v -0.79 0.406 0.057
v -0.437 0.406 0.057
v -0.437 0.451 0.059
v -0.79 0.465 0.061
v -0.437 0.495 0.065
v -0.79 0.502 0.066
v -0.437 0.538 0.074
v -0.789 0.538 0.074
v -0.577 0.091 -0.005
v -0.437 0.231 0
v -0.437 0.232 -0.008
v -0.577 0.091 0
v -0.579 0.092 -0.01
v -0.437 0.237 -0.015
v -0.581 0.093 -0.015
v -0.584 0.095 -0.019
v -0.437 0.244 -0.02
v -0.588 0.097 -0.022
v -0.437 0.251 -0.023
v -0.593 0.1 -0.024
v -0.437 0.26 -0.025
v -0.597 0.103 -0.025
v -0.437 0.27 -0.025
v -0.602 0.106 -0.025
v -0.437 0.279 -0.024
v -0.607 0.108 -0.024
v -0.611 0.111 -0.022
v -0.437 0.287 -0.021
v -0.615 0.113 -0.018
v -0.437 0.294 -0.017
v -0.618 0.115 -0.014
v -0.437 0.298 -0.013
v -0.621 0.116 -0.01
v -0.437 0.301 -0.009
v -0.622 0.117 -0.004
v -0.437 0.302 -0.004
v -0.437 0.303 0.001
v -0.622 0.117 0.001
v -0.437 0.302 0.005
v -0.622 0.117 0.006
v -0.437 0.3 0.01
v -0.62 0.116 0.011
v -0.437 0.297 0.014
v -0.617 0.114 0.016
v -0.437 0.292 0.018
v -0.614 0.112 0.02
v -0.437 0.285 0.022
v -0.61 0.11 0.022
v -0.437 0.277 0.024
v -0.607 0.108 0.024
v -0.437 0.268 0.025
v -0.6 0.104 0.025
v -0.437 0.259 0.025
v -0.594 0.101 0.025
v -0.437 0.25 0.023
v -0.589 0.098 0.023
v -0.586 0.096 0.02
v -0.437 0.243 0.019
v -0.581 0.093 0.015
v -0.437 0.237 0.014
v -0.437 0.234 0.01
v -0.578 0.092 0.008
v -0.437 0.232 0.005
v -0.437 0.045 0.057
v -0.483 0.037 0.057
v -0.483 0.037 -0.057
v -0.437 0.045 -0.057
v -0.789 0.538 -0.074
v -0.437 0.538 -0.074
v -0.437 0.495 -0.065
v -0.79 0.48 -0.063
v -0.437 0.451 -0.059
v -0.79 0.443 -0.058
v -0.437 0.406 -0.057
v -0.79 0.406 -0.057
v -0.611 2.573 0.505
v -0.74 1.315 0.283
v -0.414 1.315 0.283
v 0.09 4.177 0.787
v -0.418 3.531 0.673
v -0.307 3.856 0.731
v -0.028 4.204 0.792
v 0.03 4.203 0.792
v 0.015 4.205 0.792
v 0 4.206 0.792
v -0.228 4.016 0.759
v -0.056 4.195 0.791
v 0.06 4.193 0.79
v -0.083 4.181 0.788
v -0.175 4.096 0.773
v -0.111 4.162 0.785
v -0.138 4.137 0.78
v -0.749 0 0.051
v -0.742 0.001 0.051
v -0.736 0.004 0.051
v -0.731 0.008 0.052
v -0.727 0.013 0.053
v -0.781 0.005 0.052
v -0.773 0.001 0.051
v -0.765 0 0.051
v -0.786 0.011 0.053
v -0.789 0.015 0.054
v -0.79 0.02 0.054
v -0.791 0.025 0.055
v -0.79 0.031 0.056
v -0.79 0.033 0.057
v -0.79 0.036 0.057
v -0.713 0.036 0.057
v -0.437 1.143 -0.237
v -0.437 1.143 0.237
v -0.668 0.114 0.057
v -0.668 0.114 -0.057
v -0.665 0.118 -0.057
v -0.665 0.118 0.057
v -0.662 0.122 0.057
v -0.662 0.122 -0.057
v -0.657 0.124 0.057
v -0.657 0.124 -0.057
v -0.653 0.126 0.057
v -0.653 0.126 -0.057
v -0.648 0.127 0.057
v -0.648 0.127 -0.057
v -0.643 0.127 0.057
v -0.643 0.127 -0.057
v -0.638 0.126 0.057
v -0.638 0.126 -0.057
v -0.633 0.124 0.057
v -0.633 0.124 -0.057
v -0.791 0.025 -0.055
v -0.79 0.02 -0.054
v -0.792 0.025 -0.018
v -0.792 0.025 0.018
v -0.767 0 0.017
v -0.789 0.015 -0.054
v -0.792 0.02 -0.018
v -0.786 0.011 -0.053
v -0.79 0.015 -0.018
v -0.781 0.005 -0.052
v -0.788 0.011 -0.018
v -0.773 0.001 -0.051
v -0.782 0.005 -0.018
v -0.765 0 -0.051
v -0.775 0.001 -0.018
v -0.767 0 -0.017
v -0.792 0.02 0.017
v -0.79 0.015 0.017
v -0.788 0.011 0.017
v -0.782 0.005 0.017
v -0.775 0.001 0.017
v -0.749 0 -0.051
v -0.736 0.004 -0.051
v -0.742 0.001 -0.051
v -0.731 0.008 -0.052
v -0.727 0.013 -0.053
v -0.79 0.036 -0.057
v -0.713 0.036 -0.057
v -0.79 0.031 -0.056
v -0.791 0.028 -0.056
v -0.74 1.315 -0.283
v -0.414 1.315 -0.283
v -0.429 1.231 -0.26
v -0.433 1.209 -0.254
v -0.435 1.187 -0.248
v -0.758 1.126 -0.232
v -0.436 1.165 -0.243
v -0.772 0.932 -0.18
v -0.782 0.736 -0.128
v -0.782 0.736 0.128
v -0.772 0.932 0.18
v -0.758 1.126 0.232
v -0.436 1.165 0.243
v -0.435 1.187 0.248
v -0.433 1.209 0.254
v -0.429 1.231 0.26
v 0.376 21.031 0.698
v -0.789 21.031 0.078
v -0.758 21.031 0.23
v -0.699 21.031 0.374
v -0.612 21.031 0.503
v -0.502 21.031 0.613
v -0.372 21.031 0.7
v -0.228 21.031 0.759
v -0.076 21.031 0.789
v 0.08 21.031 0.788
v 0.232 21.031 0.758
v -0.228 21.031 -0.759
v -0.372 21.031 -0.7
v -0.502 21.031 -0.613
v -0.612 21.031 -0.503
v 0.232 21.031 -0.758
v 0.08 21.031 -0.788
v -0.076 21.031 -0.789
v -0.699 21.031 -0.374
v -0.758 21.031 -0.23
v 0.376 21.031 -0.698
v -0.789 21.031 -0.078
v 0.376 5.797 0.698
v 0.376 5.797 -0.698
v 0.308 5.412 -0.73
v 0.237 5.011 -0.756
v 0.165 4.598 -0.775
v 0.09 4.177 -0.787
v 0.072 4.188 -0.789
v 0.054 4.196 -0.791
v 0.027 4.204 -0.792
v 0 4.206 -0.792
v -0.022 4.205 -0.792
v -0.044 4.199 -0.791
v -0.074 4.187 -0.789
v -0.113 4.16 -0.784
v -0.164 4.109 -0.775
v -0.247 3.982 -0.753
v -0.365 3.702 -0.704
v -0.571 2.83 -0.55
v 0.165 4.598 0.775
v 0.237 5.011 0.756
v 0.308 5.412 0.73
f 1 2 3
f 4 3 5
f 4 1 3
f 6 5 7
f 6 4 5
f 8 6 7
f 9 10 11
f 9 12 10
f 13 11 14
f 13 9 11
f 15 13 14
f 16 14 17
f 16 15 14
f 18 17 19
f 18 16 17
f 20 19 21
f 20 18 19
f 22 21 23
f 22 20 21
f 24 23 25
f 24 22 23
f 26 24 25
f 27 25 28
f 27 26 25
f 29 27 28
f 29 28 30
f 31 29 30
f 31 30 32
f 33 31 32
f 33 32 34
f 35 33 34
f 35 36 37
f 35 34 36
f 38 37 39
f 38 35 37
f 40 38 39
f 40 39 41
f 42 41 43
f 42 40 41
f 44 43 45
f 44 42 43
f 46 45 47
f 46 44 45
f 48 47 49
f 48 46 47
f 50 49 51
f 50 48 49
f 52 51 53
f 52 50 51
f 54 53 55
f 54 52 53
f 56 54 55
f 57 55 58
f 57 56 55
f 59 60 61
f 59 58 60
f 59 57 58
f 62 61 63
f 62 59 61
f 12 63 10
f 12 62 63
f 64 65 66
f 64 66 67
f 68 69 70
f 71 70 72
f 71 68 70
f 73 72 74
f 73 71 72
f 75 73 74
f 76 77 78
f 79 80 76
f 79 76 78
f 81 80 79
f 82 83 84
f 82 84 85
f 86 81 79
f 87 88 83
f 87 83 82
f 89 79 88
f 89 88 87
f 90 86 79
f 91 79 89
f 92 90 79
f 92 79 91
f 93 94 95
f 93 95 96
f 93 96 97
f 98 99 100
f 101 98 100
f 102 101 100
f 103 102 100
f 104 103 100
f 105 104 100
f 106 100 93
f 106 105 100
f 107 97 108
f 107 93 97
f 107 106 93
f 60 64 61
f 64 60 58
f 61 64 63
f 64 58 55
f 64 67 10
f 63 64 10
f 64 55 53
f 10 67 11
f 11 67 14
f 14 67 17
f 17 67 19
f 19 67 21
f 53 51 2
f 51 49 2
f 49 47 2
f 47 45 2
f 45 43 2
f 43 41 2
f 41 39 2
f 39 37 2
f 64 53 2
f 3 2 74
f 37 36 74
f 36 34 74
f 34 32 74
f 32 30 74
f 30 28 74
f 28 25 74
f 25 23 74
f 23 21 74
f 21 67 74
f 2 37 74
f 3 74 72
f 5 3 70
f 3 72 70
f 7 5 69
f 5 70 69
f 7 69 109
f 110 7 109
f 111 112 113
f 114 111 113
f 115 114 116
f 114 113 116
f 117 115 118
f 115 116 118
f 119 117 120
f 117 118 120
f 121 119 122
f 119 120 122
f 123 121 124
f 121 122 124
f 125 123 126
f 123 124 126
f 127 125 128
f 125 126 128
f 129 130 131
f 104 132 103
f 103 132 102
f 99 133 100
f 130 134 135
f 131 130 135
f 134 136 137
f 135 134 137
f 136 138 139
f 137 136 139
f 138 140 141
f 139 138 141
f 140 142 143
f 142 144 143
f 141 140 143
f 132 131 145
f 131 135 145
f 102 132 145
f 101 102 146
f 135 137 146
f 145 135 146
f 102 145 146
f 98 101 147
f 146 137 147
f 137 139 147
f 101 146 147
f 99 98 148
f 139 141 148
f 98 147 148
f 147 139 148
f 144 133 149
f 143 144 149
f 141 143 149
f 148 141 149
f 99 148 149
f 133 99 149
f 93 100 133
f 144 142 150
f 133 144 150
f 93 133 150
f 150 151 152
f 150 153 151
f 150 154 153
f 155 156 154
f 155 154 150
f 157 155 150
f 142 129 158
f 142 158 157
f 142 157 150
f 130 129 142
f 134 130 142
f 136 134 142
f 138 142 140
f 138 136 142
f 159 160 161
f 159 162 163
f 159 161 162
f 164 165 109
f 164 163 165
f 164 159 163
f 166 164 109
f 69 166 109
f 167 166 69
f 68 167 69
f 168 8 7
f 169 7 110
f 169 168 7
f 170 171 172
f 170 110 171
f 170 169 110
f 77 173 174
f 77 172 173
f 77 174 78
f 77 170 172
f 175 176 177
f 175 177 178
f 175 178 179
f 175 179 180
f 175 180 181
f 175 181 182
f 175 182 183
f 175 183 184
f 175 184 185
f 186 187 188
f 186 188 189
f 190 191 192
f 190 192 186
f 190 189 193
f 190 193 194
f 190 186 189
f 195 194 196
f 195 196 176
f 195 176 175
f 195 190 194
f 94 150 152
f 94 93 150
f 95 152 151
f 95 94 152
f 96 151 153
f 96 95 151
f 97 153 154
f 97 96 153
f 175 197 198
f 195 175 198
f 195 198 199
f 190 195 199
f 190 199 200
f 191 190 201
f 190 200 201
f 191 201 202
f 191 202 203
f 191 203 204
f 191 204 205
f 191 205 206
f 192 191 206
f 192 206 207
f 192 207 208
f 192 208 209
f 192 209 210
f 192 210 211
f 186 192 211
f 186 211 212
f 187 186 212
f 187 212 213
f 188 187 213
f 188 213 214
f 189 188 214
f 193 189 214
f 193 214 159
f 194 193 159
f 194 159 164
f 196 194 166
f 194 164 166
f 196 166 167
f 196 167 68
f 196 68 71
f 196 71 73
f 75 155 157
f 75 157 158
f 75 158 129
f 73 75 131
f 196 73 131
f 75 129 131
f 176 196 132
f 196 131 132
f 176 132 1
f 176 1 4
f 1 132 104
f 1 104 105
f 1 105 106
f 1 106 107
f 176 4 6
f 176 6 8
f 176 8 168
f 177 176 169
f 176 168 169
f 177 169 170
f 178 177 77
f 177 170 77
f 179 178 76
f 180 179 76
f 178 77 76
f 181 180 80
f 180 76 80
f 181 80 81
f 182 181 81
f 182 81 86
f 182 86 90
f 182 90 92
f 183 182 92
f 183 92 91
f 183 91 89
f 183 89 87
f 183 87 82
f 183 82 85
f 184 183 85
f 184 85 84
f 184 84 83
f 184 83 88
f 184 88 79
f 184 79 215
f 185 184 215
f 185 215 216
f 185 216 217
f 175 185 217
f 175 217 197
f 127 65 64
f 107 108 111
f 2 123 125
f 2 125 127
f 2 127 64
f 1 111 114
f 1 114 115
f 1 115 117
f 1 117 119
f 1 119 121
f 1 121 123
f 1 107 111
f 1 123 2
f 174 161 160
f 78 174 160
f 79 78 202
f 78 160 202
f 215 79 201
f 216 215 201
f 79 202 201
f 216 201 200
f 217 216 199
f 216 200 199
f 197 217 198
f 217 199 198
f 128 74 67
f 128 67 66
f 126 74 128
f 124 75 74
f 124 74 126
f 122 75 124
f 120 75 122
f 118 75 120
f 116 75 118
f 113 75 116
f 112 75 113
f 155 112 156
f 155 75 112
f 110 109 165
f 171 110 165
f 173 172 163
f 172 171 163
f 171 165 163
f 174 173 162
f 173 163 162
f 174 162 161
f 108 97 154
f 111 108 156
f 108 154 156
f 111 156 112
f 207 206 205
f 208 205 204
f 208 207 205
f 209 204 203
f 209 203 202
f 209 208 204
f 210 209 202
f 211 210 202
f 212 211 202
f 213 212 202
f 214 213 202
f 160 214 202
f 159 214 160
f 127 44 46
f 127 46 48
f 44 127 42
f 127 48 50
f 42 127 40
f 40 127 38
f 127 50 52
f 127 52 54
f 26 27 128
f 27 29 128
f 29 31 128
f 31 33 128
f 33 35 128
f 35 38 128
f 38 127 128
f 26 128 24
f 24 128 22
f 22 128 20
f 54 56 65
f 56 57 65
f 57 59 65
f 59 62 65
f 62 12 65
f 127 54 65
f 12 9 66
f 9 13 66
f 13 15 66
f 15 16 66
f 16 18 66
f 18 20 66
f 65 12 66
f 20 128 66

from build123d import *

# Parameters (mm, degrees)
TD_REV_FEATURE_DEPTH            = 21.0312
ISA_REV_FEATURE_DEPTH           = 22.061040395
ISA_REV_FEATURE_DEPTH_BACK      = 22.061040395
BA_REV_FEATURE_DEPTH            = 22.061040395
BA_REV_FEATURE_DEPTH_BACK       = 22.061040395
SLB_REV_FEATURE_DEPTH           = 22.061040395
SLB_REV_FEATURE_DEPTH_BACK      = 22.061040395
VR_REV_FEATURE_DEPTH            = 22.061040395
VR_REV_FEATURE_DEPTH_BACK       = 22.061040395
ND_REV_FEATURE_DEPTH            = 22.061040503
ND_REV_FEATURE_DEPTH_BACK       = 22.061040503
REV_HOLE_CUT_FEATURE_DEPTH      = 22.162851782
REV_HOLE_CUT_FEATURE_DEPTH_BACK = 22.162851782
REV_F_FR_FEATURE_R              = 0.0254
REV_F_BR_FEATURE_R              = 0.0254


with BuildPart() as part:
    # td_rev_sketch → td_rev_feature (new body)
    with BuildSketch(Plane(origin=(0, 0, 0), x_dir=(1, 0, 0), z_dir=(0, 1, 0))):
        with BuildLine():
            Line((0.37592, -0.697645113), (0.37592, 0.697645113))
            ThreePointArc((0.37592, 0.697645113), (-0.79248, 0), (0.37592, -0.697645113))
        make_face()
    extrude(amount=TD_REV_FEATURE_DEPTH)

    # isa_rev_sketch → isa_rev_feature (cut, two sides: drawn at the far end of the back side and taken through both)
    with BuildSketch(Plane(origin=(0, 0, 0), x_dir=(0, 0, -1), z_dir=(1, 0, 0)).offset(-ISA_REV_FEATURE_DEPTH_BACK)):
        Polygon((8.398066277, 47.339699483), (0.79248, 4.2062763), (0.0508, 0), (-0.0508, 0), (-0.79248, 4.2062763), (-8.398066277, 47.339699483), (-8.398066277, -40.25795204), (8.398066277, -40.25795204), align=None)
    extrude(amount=ISA_REV_FEATURE_DEPTH + ISA_REV_FEATURE_DEPTH_BACK, mode=Mode.SUBTRACT)

    # ba_rev_sketch → ba_rev_feature (cut, two sides: drawn at the far end of the back side and taken through both)
    with BuildSketch(Plane.XY.offset(-BA_REV_FEATURE_DEPTH_BACK)):
        Polygon((-52.01559187, -9.04993148), (-0.69088, 0), (-0.428729423, 0.04622422), (0.37592, 4.609617863), (9.42585148, 55.934329733), (85.165346017, -15.675992153), (23.723902667, -80.660253365), align=None)
    extrude(amount=BA_REV_FEATURE_DEPTH + BA_REV_FEATURE_DEPTH_BACK, mode=Mode.SUBTRACT)

    # slb_rev_sketch → slb_rev_feature (cut, two sides: drawn at the far end of the back side and taken through both)
    with BuildSketch(Plane.XY.offset(-SLB_REV_FEATURE_DEPTH_BACK)):
        with BuildLine():
            Line((-0.43688, -52.09380084), (-0.43688, 0))
            Line((-0.43688, 0), (-0.43688, 1.143))
            ThreePointArc((-0.43688, 1.143), (-0.434946907, 1.187275117), (-0.429162339, 1.231213274))
            Line((-0.429162339, 1.231213274), (0.37592, 5.797062104))
            Line((0.37592, 5.797062104), (9.421913584, 57.099441055))
            Line((9.421913584, 57.099441055), (113.187433376, 47.730703366))
            Line((113.187433376, 47.730703366), (103.328639792, -61.462538529))
            Line((103.328639792, -61.462538529), (-0.43688, -52.09380084))
        make_face()
    extrude(amount=SLB_REV_FEATURE_DEPTH + SLB_REV_FEATURE_DEPTH_BACK, mode=Mode.SUBTRACT)

    # vr_rev_sketch → vr_rev_feature (cut, two sides: drawn at the far end of the back side and taken through both)
    with BuildSketch(Plane(origin=(0, 0, 0), x_dir=(0, 0, -1), z_dir=(1, 0, 0)).offset(-VR_REV_FEATURE_DEPTH_BACK)):
        with BuildLine():
            Line((12.638111697, 47.42606773), (0.79248, 3.217568389))
            Line((0.79248, 3.217568389), (0.07445968, 0.537880075))
            ThreePointArc((0.07445968, 0.537880075), (0.06149601, 0.472707306), (0.05715, 0.4064))
            Line((0.05715, 0.4064), (0.05715, 0))
            Line((0.05715, 0), (-0.05715, 0))
            Line((-0.05715, 0), (-0.05715, 0.4064))
            ThreePointArc((-0.05715, 0.4064), (-0.06149601, 0.472707306), (-0.07445968, 0.537880075))
            Line((-0.07445968, 0.537880075), (-0.79248, 3.217568389))
            Line((-0.79248, 3.217568389), (-12.638111697, 47.42606773))
            Line((-12.638111697, 47.42606773), (-12.638111697, -44.109944949))
            Line((-12.638111697, -44.109944949), (12.638111697, -44.109944949))
            Line((12.638111697, -44.109944949), (12.638111697, 47.42606773))
        make_face()
    extrude(amount=VR_REV_FEATURE_DEPTH + VR_REV_FEATURE_DEPTH_BACK, mode=Mode.SUBTRACT)

    # erw_rev_sketch → nd_rev_feature (cut, two sides: drawn at the far end of the back side and taken through both)
    with BuildSketch(Plane.XY.offset(-ND_REV_FEATURE_DEPTH_BACK)):
        with BuildLine():
            Line((-0.73406, 0), (-0.668068864, 0.1143))
            ThreePointArc((-0.668068864, 0.1143), (-0.652645823, 0.126134516), (-0.633371819, 0.123597045))
            Line((-0.633371819, 0.123597045), (-0.476954112, 0.03328924))
            Line((-0.476954112, 0.03328924), (-0.419295457, 0))
            Line((-0.419295457, 0), (-0.73406, 0))
        make_face()
    extrude(amount=ND_REV_FEATURE_DEPTH + ND_REV_FEATURE_DEPTH_BACK, mode=Mode.SUBTRACT)


with BuildPart() as body_2:
    # rev_hole_sketch → rev_hole_feature (revolve)
    with BuildSketch(Plane.XY):
        Polygon((-0.703570884, -0.035921024), (-0.721531396, -0.017960512), (1.354405484, 2.057976368), (2.104599043, 1.307782809), (-0.395400957, 0.272248903), align=None)
    revolve(axis=Axis((-0.721531396, -0.017960512, 0), (0.7071067811865462, 0.7071067811865489, 0)))

    # rev_hole_cut_sketch → rev_hole_cut_feature (cut, two sides: drawn at the far end of the back side and taken through both)
    with BuildSketch(Plane.XY.offset(-REV_HOLE_CUT_FEATURE_DEPTH_BACK)):
        Polygon((-46.14120993, 26.397559629), (-0.79248, 0.215458196), (-0.419295457, 0), (44.929434473, -26.182101432), (-7.434768392, -116.879561292), (-98.505412795, -64.299900231), align=None)
    extrude(amount=REV_HOLE_CUT_FEATURE_DEPTH + REV_HOLE_CUT_FEATURE_DEPTH_BACK, mode=Mode.SUBTRACT)


with BuildPart() as part_1:
    add(part.part)

    # rev_hole_combine: cut body 2
    add(body_2.part, mode=Mode.SUBTRACT)

    # rev_f_fr_feature
    rev_f_fr_feature_edges = [part_1.edges().sort_by_distance(p)[0] for p in [
        (-0.79248, 0, 0),
    ]]
    fillet(rev_f_fr_feature_edges, radius=REV_F_FR_FEATURE_R)

    # rev_f_br_feature
    rev_f_br_feature_edges = [part_1.edges().sort_by_distance(p)[0] for p in [
        (-0.73406, 0, 0),
    ]]
    fillet(rev_f_br_feature_edges, radius=REV_F_BR_FEATURE_R)


solid = part_1.part
